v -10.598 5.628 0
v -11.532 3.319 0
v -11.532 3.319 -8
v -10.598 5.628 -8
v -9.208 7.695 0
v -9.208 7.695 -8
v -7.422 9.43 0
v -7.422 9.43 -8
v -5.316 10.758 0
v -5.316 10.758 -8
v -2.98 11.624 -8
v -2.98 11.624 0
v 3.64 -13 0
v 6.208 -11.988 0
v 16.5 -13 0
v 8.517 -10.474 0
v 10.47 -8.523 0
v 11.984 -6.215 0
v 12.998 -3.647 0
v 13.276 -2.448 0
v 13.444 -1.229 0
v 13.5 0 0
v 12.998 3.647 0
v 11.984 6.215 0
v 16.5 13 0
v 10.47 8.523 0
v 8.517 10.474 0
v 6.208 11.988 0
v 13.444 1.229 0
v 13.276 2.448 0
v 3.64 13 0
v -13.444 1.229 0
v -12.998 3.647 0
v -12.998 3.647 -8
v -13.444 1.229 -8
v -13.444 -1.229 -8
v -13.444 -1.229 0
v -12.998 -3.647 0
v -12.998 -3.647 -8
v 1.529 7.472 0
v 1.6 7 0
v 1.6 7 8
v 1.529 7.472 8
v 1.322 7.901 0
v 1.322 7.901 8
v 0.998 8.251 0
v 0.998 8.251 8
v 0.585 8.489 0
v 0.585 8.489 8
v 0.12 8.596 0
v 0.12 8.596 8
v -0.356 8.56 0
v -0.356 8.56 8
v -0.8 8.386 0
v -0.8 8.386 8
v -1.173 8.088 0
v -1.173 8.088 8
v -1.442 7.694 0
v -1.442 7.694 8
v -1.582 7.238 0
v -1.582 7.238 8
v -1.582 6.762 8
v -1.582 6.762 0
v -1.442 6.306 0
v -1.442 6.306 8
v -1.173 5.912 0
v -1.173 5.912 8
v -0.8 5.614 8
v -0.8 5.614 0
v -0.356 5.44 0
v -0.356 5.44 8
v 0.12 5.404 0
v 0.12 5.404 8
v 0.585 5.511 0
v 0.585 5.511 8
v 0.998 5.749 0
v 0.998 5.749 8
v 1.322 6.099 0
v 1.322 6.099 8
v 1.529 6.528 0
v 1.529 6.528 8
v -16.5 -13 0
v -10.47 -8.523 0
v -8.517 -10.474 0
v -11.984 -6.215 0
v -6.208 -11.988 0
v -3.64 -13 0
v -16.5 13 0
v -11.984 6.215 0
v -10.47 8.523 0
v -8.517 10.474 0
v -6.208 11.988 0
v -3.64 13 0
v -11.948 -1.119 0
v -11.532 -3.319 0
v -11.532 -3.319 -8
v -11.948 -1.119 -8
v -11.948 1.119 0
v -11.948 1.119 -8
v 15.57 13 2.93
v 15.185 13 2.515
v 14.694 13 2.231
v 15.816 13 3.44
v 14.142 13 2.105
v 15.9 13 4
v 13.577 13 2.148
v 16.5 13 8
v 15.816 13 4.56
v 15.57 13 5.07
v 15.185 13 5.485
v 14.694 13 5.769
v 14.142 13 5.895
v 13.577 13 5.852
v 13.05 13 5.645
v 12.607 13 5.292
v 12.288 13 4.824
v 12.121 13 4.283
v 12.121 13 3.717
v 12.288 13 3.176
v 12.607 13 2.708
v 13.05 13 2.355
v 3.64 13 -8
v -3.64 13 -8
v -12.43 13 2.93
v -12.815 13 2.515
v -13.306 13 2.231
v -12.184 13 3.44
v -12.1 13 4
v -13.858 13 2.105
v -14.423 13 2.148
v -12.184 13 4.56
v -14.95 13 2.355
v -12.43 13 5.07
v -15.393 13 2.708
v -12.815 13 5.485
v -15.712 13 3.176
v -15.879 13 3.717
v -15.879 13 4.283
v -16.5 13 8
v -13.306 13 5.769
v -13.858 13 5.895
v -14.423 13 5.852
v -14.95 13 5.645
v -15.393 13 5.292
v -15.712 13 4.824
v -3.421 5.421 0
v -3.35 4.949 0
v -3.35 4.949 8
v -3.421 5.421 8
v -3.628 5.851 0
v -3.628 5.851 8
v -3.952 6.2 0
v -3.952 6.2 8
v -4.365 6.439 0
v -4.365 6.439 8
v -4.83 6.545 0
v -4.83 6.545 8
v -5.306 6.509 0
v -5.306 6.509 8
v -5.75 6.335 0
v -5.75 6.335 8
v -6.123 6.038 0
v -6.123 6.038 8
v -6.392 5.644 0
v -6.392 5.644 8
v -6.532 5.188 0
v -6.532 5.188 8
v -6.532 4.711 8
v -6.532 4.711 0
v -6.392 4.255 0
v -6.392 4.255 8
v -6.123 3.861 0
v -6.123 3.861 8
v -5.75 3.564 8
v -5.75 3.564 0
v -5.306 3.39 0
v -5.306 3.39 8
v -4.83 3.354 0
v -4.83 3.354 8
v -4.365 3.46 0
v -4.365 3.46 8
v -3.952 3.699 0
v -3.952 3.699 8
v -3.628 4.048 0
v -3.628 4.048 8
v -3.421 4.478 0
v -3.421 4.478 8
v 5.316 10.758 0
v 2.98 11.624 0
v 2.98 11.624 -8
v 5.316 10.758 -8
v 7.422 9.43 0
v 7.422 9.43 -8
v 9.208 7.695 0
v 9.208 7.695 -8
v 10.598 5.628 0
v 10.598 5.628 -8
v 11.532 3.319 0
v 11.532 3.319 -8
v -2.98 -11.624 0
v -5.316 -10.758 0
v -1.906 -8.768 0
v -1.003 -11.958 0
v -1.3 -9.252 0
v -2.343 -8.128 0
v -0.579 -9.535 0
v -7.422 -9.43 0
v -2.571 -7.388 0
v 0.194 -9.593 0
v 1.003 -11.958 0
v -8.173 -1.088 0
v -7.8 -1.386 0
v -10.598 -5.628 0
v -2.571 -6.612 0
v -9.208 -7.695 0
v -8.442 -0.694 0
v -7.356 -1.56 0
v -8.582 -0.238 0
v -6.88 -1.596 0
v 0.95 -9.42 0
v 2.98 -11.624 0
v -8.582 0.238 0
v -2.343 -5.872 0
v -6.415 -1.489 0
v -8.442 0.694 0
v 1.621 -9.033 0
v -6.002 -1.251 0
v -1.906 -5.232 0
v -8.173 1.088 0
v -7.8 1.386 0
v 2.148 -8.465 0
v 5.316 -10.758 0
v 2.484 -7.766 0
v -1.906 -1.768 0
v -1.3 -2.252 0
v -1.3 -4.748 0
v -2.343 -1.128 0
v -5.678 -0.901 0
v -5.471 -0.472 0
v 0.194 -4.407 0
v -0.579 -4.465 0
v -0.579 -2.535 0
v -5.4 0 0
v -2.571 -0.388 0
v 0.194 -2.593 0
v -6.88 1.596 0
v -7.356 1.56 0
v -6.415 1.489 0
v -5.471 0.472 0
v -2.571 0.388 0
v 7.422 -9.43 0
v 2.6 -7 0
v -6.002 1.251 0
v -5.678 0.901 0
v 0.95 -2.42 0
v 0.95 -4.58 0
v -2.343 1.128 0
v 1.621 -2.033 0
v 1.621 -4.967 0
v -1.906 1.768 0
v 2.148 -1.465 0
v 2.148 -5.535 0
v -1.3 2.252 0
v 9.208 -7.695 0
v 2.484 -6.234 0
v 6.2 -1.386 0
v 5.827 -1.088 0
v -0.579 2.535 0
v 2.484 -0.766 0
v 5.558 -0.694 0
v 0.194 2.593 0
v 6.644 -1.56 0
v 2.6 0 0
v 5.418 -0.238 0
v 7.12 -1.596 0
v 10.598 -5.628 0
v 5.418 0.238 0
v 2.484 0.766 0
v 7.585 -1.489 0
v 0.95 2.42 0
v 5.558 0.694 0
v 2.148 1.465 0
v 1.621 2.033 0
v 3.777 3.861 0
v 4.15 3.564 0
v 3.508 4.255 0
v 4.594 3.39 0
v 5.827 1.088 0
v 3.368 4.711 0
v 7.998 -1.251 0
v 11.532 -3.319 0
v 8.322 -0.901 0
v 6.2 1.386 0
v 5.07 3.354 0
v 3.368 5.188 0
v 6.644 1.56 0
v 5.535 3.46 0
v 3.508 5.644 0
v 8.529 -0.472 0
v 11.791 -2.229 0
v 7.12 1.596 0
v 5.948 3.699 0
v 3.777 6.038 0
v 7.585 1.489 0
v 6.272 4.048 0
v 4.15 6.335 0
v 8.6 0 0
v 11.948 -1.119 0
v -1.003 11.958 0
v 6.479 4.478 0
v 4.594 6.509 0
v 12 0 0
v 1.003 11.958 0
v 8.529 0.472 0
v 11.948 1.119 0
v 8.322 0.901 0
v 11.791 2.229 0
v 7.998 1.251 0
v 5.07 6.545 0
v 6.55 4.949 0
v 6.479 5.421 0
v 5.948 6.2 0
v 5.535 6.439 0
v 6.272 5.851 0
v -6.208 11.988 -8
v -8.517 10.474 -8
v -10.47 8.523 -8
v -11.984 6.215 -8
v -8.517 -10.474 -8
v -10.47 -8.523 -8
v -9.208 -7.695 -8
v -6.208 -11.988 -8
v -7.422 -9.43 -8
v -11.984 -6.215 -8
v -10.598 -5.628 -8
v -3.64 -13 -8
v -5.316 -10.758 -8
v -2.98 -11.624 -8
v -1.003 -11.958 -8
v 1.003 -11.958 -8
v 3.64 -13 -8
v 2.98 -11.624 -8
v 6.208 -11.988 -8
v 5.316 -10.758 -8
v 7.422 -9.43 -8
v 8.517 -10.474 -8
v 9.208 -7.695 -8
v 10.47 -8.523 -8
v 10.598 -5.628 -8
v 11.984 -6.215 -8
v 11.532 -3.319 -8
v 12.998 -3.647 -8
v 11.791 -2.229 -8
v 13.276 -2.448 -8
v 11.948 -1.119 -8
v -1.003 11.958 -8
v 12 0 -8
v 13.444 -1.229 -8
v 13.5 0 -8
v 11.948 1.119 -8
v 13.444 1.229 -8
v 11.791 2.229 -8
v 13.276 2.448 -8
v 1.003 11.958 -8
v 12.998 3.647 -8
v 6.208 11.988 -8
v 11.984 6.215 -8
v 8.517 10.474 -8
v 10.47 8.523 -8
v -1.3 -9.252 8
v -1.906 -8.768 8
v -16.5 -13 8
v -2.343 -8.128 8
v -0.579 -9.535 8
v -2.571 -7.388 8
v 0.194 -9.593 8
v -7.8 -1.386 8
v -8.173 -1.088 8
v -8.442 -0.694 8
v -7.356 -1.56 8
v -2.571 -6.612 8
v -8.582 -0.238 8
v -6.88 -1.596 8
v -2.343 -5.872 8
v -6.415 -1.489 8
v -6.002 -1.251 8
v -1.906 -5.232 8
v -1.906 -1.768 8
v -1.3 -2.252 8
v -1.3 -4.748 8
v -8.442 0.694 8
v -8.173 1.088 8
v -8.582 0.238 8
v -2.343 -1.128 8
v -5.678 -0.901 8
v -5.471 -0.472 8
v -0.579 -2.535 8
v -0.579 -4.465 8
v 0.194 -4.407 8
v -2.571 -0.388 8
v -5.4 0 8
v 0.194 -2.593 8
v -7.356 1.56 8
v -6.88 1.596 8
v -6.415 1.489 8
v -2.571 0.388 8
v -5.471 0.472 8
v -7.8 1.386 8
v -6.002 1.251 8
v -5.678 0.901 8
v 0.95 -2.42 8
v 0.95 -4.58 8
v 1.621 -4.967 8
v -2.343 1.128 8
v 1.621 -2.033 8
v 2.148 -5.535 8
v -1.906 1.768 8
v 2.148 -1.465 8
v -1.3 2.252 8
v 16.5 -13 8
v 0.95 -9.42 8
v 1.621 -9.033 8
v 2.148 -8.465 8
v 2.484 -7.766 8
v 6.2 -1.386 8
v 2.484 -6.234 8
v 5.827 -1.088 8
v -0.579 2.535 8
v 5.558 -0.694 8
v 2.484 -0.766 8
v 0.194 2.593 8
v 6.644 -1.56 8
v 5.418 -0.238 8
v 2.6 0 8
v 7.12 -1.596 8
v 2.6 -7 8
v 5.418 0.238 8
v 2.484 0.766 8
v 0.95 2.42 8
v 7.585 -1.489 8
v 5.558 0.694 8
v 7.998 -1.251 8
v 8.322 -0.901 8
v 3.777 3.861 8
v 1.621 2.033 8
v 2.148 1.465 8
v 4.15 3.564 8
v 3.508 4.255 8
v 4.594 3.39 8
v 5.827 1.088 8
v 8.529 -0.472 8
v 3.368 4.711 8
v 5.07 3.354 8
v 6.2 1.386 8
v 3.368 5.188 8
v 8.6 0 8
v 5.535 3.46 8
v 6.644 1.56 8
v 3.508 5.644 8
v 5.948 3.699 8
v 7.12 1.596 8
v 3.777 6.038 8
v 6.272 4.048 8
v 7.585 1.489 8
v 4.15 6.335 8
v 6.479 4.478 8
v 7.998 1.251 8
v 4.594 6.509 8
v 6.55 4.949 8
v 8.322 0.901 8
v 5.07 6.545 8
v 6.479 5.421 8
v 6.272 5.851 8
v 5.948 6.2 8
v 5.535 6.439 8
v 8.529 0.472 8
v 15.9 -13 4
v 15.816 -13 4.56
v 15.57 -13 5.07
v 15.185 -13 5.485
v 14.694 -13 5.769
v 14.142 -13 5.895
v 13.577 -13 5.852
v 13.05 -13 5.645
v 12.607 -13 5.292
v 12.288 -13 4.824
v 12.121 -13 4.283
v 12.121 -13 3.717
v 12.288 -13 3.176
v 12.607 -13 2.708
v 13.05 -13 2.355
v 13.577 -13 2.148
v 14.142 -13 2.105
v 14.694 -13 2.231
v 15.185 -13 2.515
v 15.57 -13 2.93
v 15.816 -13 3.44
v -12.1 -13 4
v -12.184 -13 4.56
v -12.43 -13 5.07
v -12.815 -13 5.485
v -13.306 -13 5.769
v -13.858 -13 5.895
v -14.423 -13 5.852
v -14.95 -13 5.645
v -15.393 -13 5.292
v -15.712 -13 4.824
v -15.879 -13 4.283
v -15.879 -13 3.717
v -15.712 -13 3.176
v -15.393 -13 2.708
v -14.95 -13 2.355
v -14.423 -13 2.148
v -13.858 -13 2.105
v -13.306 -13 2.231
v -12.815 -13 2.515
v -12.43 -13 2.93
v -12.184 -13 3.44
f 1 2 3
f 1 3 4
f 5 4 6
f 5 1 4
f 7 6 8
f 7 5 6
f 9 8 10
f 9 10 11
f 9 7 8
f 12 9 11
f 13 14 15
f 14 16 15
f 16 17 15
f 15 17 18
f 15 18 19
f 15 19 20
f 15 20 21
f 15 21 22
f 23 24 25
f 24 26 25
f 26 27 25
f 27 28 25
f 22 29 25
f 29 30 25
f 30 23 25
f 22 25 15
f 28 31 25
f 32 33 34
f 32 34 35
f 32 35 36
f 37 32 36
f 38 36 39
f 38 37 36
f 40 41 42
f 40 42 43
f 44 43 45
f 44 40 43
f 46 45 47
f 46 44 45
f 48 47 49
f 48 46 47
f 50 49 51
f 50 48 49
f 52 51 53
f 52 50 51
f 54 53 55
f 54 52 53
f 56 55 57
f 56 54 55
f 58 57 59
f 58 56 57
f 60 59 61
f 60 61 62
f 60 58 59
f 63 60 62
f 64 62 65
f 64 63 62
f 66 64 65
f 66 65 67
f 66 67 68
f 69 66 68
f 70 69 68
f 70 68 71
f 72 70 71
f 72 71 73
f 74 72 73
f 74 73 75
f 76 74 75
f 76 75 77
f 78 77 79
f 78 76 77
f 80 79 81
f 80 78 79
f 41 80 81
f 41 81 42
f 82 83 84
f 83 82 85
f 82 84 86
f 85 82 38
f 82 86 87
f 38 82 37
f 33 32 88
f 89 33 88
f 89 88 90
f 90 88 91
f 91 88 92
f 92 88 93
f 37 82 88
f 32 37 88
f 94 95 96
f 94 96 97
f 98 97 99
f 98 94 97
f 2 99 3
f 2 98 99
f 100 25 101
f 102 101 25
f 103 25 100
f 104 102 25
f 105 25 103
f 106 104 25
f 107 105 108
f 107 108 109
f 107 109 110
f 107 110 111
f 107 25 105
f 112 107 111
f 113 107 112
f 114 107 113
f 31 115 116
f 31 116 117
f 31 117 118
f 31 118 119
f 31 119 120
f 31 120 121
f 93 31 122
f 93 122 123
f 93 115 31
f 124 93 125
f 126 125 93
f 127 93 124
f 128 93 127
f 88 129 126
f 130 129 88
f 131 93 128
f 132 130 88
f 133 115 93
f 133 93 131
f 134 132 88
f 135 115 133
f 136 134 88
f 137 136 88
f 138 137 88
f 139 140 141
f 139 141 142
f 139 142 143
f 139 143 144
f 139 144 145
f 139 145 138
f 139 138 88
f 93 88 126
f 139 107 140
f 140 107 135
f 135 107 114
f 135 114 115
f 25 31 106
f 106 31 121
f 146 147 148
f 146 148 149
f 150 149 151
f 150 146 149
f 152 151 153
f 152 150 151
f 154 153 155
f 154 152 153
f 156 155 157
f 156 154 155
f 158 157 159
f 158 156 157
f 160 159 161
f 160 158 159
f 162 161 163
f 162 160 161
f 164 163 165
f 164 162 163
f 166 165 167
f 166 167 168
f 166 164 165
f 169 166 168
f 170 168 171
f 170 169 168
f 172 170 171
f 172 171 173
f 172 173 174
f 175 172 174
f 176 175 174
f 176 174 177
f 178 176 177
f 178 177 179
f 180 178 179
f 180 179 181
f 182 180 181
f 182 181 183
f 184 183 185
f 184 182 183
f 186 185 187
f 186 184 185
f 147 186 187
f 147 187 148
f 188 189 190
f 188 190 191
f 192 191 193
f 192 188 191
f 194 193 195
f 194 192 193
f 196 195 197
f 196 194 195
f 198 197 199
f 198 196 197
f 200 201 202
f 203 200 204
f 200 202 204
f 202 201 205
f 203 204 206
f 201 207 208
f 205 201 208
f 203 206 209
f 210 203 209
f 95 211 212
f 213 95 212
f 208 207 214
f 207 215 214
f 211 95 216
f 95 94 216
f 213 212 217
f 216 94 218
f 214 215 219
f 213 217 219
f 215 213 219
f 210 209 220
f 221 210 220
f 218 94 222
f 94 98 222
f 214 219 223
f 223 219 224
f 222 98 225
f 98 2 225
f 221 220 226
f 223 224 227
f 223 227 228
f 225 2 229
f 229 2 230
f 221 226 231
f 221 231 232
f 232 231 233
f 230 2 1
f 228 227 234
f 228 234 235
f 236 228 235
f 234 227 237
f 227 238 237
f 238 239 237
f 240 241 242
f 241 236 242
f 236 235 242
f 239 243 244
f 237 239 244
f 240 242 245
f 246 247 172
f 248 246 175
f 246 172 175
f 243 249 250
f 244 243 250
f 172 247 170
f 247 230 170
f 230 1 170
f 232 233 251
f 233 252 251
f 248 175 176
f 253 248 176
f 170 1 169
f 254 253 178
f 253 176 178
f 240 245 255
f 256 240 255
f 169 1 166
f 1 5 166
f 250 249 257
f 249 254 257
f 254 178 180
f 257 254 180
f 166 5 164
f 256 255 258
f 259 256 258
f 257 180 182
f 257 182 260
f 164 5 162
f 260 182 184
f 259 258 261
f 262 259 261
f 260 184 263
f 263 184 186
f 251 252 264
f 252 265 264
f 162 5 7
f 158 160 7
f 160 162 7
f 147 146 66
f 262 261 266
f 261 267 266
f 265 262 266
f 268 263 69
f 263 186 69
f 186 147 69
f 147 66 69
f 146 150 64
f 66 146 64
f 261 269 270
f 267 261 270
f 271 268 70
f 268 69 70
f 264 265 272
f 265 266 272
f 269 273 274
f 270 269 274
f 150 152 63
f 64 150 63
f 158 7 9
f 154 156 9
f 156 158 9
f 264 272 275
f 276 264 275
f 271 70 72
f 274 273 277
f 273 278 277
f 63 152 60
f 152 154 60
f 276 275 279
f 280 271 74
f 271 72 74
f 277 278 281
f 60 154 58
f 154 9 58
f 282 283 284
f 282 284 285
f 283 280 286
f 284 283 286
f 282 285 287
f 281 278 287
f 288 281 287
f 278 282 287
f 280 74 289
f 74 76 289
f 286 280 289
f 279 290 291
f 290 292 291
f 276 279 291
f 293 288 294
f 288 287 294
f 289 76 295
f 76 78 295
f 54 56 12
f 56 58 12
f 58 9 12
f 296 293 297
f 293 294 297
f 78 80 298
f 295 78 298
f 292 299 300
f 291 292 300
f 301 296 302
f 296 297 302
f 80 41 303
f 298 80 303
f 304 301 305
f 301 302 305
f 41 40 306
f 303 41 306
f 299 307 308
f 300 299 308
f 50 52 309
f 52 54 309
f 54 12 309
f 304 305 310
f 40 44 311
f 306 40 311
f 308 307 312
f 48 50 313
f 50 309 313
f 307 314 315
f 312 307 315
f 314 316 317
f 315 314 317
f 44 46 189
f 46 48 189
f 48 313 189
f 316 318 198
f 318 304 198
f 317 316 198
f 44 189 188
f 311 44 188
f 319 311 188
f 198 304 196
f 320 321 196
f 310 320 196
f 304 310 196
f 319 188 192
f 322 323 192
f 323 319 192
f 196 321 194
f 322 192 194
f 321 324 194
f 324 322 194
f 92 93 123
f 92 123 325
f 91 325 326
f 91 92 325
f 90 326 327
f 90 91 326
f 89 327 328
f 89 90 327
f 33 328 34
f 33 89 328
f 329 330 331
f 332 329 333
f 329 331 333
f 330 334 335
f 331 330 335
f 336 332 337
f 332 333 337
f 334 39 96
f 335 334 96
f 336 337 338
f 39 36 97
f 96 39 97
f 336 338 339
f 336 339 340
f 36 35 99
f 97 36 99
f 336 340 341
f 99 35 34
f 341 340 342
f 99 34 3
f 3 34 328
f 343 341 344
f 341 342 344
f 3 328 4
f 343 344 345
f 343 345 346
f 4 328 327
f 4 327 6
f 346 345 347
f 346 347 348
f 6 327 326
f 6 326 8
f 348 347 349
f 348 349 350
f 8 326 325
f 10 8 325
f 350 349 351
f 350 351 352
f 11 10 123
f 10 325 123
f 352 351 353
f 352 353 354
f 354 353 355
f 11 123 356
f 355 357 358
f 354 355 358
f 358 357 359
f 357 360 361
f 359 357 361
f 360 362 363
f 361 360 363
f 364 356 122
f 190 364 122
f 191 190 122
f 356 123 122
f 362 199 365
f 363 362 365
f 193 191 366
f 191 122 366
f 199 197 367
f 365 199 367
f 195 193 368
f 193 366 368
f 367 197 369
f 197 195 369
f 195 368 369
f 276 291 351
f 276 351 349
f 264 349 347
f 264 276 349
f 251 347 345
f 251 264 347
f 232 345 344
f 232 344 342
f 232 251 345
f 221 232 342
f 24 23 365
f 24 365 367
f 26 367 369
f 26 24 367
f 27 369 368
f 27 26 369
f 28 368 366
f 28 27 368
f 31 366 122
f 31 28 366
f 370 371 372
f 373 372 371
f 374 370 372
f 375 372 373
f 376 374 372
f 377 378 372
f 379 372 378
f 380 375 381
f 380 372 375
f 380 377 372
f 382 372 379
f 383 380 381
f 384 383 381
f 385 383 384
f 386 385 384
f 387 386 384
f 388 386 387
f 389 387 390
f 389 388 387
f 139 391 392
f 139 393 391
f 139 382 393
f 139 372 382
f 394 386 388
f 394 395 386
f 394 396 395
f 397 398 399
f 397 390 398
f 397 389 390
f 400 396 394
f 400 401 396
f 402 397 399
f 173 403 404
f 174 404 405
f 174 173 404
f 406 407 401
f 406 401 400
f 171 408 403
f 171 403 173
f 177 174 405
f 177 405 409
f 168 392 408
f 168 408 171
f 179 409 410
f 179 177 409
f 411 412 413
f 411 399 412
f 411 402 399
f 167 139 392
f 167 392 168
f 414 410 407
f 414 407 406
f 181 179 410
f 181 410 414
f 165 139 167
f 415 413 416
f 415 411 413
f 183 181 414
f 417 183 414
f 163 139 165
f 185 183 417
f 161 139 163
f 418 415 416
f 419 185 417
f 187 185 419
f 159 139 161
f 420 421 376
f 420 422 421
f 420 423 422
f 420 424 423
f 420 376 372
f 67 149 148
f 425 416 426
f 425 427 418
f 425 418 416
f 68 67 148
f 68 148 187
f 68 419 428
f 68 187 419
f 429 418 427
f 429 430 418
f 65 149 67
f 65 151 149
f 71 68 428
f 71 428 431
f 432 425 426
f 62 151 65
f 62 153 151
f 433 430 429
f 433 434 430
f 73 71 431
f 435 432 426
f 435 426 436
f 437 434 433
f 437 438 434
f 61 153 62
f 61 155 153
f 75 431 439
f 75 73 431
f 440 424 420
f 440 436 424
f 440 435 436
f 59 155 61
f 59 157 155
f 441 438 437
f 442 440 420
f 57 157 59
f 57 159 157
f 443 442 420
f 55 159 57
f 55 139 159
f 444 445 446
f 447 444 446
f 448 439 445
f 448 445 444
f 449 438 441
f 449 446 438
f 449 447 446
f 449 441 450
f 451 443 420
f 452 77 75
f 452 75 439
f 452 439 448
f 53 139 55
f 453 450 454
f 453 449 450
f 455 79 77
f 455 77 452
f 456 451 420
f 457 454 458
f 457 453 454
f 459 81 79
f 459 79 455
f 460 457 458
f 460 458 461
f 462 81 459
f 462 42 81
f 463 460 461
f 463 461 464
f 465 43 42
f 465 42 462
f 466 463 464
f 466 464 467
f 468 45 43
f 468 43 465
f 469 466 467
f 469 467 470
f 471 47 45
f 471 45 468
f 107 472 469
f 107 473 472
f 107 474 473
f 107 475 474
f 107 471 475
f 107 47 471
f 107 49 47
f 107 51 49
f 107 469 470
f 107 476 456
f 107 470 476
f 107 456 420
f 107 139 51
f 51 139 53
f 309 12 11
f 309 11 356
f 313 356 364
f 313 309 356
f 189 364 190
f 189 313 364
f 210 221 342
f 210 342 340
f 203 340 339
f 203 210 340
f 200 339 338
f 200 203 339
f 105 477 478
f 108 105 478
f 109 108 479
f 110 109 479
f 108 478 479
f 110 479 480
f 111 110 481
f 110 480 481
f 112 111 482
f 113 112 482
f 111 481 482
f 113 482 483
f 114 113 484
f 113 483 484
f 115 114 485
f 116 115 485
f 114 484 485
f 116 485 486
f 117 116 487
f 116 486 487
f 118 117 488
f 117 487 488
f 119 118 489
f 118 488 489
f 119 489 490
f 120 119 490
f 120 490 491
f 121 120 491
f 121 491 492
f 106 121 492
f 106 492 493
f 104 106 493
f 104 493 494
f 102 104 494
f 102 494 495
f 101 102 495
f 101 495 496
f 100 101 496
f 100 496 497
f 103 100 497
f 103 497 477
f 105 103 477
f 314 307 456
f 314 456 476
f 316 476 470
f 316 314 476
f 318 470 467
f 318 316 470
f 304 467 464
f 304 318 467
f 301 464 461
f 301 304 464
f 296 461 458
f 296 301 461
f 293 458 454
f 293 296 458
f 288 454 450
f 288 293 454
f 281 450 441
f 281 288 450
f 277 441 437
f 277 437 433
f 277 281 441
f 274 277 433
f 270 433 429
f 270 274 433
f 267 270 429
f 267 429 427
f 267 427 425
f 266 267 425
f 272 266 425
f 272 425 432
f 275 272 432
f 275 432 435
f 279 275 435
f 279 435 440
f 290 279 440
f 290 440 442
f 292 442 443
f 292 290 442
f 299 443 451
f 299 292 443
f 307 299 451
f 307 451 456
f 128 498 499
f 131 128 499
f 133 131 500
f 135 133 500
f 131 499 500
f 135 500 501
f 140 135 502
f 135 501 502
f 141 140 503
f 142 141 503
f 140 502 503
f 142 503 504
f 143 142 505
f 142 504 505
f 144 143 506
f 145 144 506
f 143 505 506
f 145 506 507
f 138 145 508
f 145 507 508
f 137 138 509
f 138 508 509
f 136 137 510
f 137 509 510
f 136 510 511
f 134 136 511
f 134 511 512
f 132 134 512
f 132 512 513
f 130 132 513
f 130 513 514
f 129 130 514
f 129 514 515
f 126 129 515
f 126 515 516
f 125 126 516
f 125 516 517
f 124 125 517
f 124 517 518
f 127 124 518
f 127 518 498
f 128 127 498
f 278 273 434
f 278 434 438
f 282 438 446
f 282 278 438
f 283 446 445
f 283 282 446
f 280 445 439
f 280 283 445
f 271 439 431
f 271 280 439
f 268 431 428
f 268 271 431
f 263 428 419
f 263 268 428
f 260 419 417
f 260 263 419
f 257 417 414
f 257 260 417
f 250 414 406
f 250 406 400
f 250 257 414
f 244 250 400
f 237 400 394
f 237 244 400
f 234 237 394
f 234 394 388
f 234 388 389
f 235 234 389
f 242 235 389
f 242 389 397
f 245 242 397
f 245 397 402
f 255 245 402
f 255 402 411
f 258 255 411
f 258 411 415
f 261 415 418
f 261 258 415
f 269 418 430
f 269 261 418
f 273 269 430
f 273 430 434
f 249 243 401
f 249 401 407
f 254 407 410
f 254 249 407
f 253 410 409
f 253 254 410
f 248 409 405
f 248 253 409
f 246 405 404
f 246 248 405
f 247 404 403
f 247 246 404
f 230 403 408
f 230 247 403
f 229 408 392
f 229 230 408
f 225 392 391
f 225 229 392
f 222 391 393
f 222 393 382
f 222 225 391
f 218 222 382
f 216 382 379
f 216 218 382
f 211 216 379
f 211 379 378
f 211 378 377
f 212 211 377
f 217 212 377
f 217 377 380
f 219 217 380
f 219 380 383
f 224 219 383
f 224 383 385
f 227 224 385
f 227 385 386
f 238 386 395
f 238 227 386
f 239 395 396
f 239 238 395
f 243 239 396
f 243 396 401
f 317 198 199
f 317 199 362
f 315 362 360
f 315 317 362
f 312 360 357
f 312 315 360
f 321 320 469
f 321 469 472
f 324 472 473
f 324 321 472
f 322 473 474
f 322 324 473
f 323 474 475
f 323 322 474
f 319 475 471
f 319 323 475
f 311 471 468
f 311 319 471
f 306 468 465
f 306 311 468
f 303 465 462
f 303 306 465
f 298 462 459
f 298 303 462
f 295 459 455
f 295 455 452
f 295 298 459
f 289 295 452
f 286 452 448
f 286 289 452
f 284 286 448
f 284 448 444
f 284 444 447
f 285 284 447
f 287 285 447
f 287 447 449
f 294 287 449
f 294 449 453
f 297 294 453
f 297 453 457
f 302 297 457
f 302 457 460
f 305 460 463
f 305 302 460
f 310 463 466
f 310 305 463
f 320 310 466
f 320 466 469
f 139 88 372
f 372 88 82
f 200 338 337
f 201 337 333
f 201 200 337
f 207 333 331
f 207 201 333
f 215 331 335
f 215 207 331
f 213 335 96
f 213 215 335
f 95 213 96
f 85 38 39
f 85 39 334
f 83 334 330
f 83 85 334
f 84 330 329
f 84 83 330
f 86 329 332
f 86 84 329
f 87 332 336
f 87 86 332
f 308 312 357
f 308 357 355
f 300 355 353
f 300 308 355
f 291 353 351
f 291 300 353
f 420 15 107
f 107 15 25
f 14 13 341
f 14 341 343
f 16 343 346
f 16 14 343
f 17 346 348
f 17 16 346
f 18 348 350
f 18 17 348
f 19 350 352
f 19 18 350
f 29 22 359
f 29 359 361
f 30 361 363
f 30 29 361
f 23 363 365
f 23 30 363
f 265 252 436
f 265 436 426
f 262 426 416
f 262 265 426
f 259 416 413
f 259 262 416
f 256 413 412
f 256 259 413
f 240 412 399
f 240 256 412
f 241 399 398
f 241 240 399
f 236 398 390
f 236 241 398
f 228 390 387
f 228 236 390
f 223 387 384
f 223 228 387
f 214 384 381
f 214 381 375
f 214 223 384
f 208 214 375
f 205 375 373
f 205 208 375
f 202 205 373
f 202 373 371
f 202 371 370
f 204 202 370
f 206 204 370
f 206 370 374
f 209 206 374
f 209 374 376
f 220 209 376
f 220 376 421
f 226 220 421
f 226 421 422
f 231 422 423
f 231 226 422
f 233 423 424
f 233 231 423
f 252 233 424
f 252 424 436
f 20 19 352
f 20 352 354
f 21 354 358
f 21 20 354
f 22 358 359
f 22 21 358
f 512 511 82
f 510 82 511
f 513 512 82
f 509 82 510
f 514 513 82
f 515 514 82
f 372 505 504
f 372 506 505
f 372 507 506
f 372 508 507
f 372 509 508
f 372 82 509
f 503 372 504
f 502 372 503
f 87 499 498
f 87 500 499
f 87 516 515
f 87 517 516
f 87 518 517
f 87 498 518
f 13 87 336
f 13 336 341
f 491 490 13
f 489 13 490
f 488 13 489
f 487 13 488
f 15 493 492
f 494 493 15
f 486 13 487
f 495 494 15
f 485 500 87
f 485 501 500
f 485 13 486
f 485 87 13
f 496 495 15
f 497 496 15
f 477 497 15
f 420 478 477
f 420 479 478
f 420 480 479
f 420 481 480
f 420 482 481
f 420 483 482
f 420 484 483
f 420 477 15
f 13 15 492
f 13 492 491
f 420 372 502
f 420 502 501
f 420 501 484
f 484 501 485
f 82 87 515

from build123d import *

# Parameters (mm, degrees)
F0_R     = 4.25
F0_R_2   = 2.6
F1_DEPTH = 8
F0_R_3   = 10.25
F0_R_4   = 1.6
F2_DEPTH = 8
F3_DEPTH = 8
F4_DEPTH = 8
F5_R     = 1.9
F6_DEPTH = 27


with BuildPart() as f1:
    # F0 (on Top) → F1 (new body)
    with BuildSketch(Plane.XY):
        Circle(F0_R)
        Circle(F0_R_2, mode=Mode.SUBTRACT)
    extrude(amount=F1_DEPTH)

    # F0 (on Top) → F2 (join)
    with BuildSketch(Plane.XY):
        Circle(F0_R_3)
        with Locations((0, -7)):
            Circle(F0_R_2, mode=Mode.SUBTRACT)
        with Locations((-7, 0)):
            Circle(F0_R_4, mode=Mode.SUBTRACT)
        with Locations((-4.95, 4.9494949237)):
            Circle(F0_R_4, mode=Mode.SUBTRACT)
        Circle(F0_R, mode=Mode.SUBTRACT)
        with Locations((7, 0)):
            Circle(F0_R_4, mode=Mode.SUBTRACT)
        with Locations((4.95, 4.9494949237)):
            Circle(F0_R_4, mode=Mode.SUBTRACT)
        with Locations((0, 7)):
            Circle(F0_R_4, mode=Mode.SUBTRACT)
    extrude(amount=F2_DEPTH)

    # F0 (on Top) → F3 (join)
    with BuildSketch(Plane.XY):
        with BuildLine():
            ThreePointArc((11.5318049333, -3.3192581973), (11.8823747458, -1.6760579943), (12, 0))
            ThreePointArc((12, 0), (11.8823747458, 1.6760579943), (11.5318049333, 3.3192581973))
            ThreePointArc((11.5318049333, 3.3192581973), (8.3601945025, 8.6085508583), (2.9803472847, 11.6240066269))
            ThreePointArc((2.9803472847, 11.6240066269), (0, 12), (-2.9803472847, 11.6240066269))
            ThreePointArc((-2.9803472847, 11.6240066269), (-8.3601945025, 8.6085508583), (-11.5318049333, 3.3192581973))
            ThreePointArc((-11.5318049333, 3.3192581973), (-12, 0), (-11.5318049333, -3.3192581973))
            ThreePointArc((-11.5318049333, -3.3192581973), (-8.3601945025, -8.6085508583), (-2.9803472847, -11.6240066269))
            ThreePointArc((-2.9803472847, -11.6240066269), (0, -12), (2.9803472847, -11.6240066269))
            ThreePointArc((2.9803472847, -11.6240066269), (8.3601945025, -8.6085508583), (11.5318049333, -3.3192581973))
        make_face()
        Circle(F0_R_3, mode=Mode.SUBTRACT)
        with BuildLine():
            ThreePointArc((2.9803472847, 11.6240066269), (8.3601945025, 8.6085508583), (11.5318049333, 3.3192581973))
            Line((11.5318049333, 3.3192581973), (12.9980264072, 3.6470960391))
            ThreePointArc((12.9980264072, 3.6470960391), (9.5433558507, 9.5485265412), (3.6400549446, 13))
            Line((3.6400549446, 13), (3.3579982004, 13))
            Line((3.3579982004, 13), (2.9803472847, 11.6240066269))
        make_face()
        with BuildLine():
            ThreePointArc((-2.9803472847, 11.6240066269), (0, 12), (2.9803472847, 11.6240066269))
            Line((2.9803472847, 11.6240066269), (3.3579982004, 13))
            Line((3.3579982004, 13), (-3.3579982004, 13))
            Line((-3.3579982004, 13), (-2.9803472847, 11.6240066269))
        make_face()
        with BuildLine():
            ThreePointArc((3.6400549446, 13), (9.5433558507, 9.5485265412), (12.9980264072, 3.6470960391))
            ThreePointArc((12.9980264072, 3.6470960391), (13.3739178347, 1.8407394578), (13.5, 0))
            ThreePointArc((13.5, 0), (13.3739178347, -1.8407394578), (12.9980264072, -3.6470960391))
            ThreePointArc((12.9980264072, -3.6470960391), (9.5433558507, -9.5485265412), (3.6400549446, -13))
            Line((3.6400549446, -13), (16.5, -13))
            Line((16.5, -13), (16.5, 13))
            Line((16.5, 13), (3.6400549446, 13))
        make_face()
        with BuildLine():
            ThreePointArc((11.5318049333, 3.3192581973), (11.8823747458, 1.6760579943), (12, 0))
            ThreePointArc((12, 0), (11.8823747458, -1.6760579943), (11.5318049333, -3.3192581973))
            Line((11.5318049333, -3.3192581973), (12.9980264072, -3.6470960391))
            ThreePointArc((12.9980264072, -3.6470960391), (13.3739178347, -1.8407394578), (13.5, 0))
            ThreePointArc((13.5, 0), (13.3739178347, 1.8407394578), (12.9980264072, 3.6470960391))
            Line((12.9980264072, 3.6470960391), (11.5318049333, 3.3192581973))
        make_face()
        with BuildLine():
            Line((12.9980264072, -3.6470960391), (11.5318049333, -3.3192581973))
            ThreePointArc((11.5318049333, -3.3192581973), (8.3601945025, -8.6085508583), (2.9803472847, -11.6240066269))
            Line((2.9803472847, -11.6240066269), (3.3579982004, -13))
            Line((3.3579982004, -13), (3.6400549446, -13))
            ThreePointArc((3.6400549446, -13), (9.5433558507, -9.5485265412), (12.9980264072, -3.6470960391))
        make_face()
        with BuildLine():
            Line((3.3579982004, -13), (2.9803472847, -11.6240066269))
            ThreePointArc((2.9803472847, -11.6240066269), (0, -12), (-2.9803472847, -11.6240066269))
            Line((-2.9803472847, -11.6240066269), (-3.3579982004, -13))
            Line((-3.3579982004, -13), (3.3579982004, -13))
        make_face()
        with BuildLine():
            Line((-3.3579982004, -13), (-2.9803472847, -11.6240066269))
            ThreePointArc((-2.9803472847, -11.6240066269), (-8.3601945025, -8.6085508583), (-11.5318049333, -3.3192581973))
            Line((-11.5318049333, -3.3192581973), (-12.9980264072, -3.6470960391))
            ThreePointArc((-12.9980264072, -3.6470960391), (-9.5433558507, -9.5485265412), (-3.6400549446, -13))
            Line((-3.6400549446, -13), (-3.3579982004, -13))
        make_face()
        with BuildLine():
            ThreePointArc((-12.9980264072, -3.6470960391), (-13.5, 0), (-12.9980264072, 3.6470960391))
            ThreePointArc((-12.9980264072, 3.6470960391), (-9.5433558507, 9.5485265412), (-3.6400549446, 13))
            Line((-3.6400549446, 13), (-16.5, 13))
            Line((-16.5, 13), (-16.5, -13))
            Line((-16.5, -13), (-3.6400549446, -13))
            ThreePointArc((-3.6400549446, -13), (-9.5433558507, -9.5485265412), (-12.9980264072, -3.6470960391))
        make_face()
        with BuildLine():
            ThreePointArc((-11.5318049333, -3.3192581973), (-12, 0), (-11.5318049333, 3.3192581973))
            Line((-11.5318049333, 3.3192581973), (-12.9980264072, 3.6470960391))
            ThreePointArc((-12.9980264072, 3.6470960391), (-13.5, 0), (-12.9980264072, -3.6470960391))
            Line((-12.9980264072, -3.6470960391), (-11.5318049333, -3.3192581973))
        make_face()
        with BuildLine():
            ThreePointArc((-11.5318049333, 3.3192581973), (-8.3601945025, 8.6085508583), (-2.9803472847, 11.6240066269))
            Line((-2.9803472847, 11.6240066269), (-3.3579982004, 13))
            Line((-3.3579982004, 13), (-3.6400549446, 13))
            ThreePointArc((-3.6400549446, 13), (-9.5433558507, 9.5485265412), (-12.9980264072, 3.6470960391))
            Line((-12.9980264072, 3.6470960391), (-11.5318049333, 3.3192581973))
        make_face()
    extrude(amount=F3_DEPTH)

    # F0 (on Top) → F4 (join, symmetric)
    with BuildSketch(Plane.XY):
        with BuildLine():
            Line((-3.3579982004, -13), (-2.9803472847, -11.6240066269))
            ThreePointArc((-2.9803472847, -11.6240066269), (-8.3601945025, -8.6085508583), (-11.5318049333, -3.3192581973))
            Line((-11.5318049333, -3.3192581973), (-12.9980264072, -3.6470960391))
            ThreePointArc((-12.9980264072, -3.6470960391), (-9.5433558507, -9.5485265412), (-3.6400549446, -13))
            Line((-3.6400549446, -13), (-3.3579982004, -13))
        make_face()
        with BuildLine():
            Line((12.9980264072, -3.6470960391), (11.5318049333, -3.3192581973))
            ThreePointArc((11.5318049333, -3.3192581973), (8.3601945025, -8.6085508583), (2.9803472847, -11.6240066269))
            Line((2.9803472847, -11.6240066269), (3.3579982004, -13))
            Line((3.3579982004, -13), (3.6400549446, -13))
            ThreePointArc((3.6400549446, -13), (9.5433558507, -9.5485265412), (12.9980264072, -3.6470960391))
        make_face()
        with BuildLine():
            ThreePointArc((2.9803472847, 11.6240066269), (8.3601945025, 8.6085508583), (11.5318049333, 3.3192581973))
            Line((11.5318049333, 3.3192581973), (12.9980264072, 3.6470960391))
            ThreePointArc((12.9980264072, 3.6470960391), (9.5433558507, 9.5485265412), (3.6400549446, 13))
            Line((3.6400549446, 13), (3.3579982004, 13))
            Line((3.3579982004, 13), (2.9803472847, 11.6240066269))
        make_face()
        with BuildLine():
            ThreePointArc((-11.5318049333, 3.3192581973), (-8.3601945025, 8.6085508583), (-2.9803472847, 11.6240066269))
            Line((-2.9803472847, 11.6240066269), (-3.3579982004, 13))
            Line((-3.3579982004, 13), (-3.6400549446, 13))
            ThreePointArc((-3.6400549446, 13), (-9.5433558507, 9.5485265412), (-12.9980264072, 3.6470960391))
            Line((-12.9980264072, 3.6470960391), (-11.5318049333, 3.3192581973))
        make_face()
        with BuildLine():
            Line((3.3579982004, -13), (2.9803472847, -11.6240066269))
            ThreePointArc((2.9803472847, -11.6240066269), (0, -12), (-2.9803472847, -11.6240066269))
            Line((-2.9803472847, -11.6240066269), (-3.3579982004, -13))
            Line((-3.3579982004, -13), (3.3579982004, -13))
        make_face()
        with BuildLine():
            ThreePointArc((-11.5318049333, -3.3192581973), (-12, 0), (-11.5318049333, 3.3192581973))
            Line((-11.5318049333, 3.3192581973), (-12.9980264072, 3.6470960391))
            ThreePointArc((-12.9980264072, 3.6470960391), (-13.5, 0), (-12.9980264072, -3.6470960391))
            Line((-12.9980264072, -3.6470960391), (-11.5318049333, -3.3192581973))
        make_face()
        with BuildLine():
            ThreePointArc((11.5318049333, 3.3192581973), (11.8823747458, 1.6760579943), (12, 0))
            ThreePointArc((12, 0), (11.8823747458, -1.6760579943), (11.5318049333, -3.3192581973))
            Line((11.5318049333, -3.3192581973), (12.9980264072, -3.6470960391))
            ThreePointArc((12.9980264072, -3.6470960391), (13.3739178347, -1.8407394578), (13.5, 0))
            ThreePointArc((13.5, 0), (13.3739178347, 1.8407394578), (12.9980264072, 3.6470960391))
            Line((12.9980264072, 3.6470960391), (11.5318049333, 3.3192581973))
        make_face()
        with BuildLine():
            ThreePointArc((-2.9803472847, 11.6240066269), (0, 12), (2.9803472847, 11.6240066269))
            Line((2.9803472847, 11.6240066269), (3.3579982004, 13))
            Line((3.3579982004, 13), (-3.3579982004, 13))
            Line((-3.3579982004, 13), (-2.9803472847, 11.6240066269))
        make_face()
    extrude(amount=F4_DEPTH, both=True)

    # F5 (on face) → F6 (cut)
    with BuildSketch(Plane.XZ.offset(13)):
        with Locations((-14, 4)):
            Circle(F5_R)
        with Locations((14, 4)):
            Circle(F5_R)
    extrude(amount=-F6_DEPTH, mode=Mode.SUBTRACT)


solid = f1.part
